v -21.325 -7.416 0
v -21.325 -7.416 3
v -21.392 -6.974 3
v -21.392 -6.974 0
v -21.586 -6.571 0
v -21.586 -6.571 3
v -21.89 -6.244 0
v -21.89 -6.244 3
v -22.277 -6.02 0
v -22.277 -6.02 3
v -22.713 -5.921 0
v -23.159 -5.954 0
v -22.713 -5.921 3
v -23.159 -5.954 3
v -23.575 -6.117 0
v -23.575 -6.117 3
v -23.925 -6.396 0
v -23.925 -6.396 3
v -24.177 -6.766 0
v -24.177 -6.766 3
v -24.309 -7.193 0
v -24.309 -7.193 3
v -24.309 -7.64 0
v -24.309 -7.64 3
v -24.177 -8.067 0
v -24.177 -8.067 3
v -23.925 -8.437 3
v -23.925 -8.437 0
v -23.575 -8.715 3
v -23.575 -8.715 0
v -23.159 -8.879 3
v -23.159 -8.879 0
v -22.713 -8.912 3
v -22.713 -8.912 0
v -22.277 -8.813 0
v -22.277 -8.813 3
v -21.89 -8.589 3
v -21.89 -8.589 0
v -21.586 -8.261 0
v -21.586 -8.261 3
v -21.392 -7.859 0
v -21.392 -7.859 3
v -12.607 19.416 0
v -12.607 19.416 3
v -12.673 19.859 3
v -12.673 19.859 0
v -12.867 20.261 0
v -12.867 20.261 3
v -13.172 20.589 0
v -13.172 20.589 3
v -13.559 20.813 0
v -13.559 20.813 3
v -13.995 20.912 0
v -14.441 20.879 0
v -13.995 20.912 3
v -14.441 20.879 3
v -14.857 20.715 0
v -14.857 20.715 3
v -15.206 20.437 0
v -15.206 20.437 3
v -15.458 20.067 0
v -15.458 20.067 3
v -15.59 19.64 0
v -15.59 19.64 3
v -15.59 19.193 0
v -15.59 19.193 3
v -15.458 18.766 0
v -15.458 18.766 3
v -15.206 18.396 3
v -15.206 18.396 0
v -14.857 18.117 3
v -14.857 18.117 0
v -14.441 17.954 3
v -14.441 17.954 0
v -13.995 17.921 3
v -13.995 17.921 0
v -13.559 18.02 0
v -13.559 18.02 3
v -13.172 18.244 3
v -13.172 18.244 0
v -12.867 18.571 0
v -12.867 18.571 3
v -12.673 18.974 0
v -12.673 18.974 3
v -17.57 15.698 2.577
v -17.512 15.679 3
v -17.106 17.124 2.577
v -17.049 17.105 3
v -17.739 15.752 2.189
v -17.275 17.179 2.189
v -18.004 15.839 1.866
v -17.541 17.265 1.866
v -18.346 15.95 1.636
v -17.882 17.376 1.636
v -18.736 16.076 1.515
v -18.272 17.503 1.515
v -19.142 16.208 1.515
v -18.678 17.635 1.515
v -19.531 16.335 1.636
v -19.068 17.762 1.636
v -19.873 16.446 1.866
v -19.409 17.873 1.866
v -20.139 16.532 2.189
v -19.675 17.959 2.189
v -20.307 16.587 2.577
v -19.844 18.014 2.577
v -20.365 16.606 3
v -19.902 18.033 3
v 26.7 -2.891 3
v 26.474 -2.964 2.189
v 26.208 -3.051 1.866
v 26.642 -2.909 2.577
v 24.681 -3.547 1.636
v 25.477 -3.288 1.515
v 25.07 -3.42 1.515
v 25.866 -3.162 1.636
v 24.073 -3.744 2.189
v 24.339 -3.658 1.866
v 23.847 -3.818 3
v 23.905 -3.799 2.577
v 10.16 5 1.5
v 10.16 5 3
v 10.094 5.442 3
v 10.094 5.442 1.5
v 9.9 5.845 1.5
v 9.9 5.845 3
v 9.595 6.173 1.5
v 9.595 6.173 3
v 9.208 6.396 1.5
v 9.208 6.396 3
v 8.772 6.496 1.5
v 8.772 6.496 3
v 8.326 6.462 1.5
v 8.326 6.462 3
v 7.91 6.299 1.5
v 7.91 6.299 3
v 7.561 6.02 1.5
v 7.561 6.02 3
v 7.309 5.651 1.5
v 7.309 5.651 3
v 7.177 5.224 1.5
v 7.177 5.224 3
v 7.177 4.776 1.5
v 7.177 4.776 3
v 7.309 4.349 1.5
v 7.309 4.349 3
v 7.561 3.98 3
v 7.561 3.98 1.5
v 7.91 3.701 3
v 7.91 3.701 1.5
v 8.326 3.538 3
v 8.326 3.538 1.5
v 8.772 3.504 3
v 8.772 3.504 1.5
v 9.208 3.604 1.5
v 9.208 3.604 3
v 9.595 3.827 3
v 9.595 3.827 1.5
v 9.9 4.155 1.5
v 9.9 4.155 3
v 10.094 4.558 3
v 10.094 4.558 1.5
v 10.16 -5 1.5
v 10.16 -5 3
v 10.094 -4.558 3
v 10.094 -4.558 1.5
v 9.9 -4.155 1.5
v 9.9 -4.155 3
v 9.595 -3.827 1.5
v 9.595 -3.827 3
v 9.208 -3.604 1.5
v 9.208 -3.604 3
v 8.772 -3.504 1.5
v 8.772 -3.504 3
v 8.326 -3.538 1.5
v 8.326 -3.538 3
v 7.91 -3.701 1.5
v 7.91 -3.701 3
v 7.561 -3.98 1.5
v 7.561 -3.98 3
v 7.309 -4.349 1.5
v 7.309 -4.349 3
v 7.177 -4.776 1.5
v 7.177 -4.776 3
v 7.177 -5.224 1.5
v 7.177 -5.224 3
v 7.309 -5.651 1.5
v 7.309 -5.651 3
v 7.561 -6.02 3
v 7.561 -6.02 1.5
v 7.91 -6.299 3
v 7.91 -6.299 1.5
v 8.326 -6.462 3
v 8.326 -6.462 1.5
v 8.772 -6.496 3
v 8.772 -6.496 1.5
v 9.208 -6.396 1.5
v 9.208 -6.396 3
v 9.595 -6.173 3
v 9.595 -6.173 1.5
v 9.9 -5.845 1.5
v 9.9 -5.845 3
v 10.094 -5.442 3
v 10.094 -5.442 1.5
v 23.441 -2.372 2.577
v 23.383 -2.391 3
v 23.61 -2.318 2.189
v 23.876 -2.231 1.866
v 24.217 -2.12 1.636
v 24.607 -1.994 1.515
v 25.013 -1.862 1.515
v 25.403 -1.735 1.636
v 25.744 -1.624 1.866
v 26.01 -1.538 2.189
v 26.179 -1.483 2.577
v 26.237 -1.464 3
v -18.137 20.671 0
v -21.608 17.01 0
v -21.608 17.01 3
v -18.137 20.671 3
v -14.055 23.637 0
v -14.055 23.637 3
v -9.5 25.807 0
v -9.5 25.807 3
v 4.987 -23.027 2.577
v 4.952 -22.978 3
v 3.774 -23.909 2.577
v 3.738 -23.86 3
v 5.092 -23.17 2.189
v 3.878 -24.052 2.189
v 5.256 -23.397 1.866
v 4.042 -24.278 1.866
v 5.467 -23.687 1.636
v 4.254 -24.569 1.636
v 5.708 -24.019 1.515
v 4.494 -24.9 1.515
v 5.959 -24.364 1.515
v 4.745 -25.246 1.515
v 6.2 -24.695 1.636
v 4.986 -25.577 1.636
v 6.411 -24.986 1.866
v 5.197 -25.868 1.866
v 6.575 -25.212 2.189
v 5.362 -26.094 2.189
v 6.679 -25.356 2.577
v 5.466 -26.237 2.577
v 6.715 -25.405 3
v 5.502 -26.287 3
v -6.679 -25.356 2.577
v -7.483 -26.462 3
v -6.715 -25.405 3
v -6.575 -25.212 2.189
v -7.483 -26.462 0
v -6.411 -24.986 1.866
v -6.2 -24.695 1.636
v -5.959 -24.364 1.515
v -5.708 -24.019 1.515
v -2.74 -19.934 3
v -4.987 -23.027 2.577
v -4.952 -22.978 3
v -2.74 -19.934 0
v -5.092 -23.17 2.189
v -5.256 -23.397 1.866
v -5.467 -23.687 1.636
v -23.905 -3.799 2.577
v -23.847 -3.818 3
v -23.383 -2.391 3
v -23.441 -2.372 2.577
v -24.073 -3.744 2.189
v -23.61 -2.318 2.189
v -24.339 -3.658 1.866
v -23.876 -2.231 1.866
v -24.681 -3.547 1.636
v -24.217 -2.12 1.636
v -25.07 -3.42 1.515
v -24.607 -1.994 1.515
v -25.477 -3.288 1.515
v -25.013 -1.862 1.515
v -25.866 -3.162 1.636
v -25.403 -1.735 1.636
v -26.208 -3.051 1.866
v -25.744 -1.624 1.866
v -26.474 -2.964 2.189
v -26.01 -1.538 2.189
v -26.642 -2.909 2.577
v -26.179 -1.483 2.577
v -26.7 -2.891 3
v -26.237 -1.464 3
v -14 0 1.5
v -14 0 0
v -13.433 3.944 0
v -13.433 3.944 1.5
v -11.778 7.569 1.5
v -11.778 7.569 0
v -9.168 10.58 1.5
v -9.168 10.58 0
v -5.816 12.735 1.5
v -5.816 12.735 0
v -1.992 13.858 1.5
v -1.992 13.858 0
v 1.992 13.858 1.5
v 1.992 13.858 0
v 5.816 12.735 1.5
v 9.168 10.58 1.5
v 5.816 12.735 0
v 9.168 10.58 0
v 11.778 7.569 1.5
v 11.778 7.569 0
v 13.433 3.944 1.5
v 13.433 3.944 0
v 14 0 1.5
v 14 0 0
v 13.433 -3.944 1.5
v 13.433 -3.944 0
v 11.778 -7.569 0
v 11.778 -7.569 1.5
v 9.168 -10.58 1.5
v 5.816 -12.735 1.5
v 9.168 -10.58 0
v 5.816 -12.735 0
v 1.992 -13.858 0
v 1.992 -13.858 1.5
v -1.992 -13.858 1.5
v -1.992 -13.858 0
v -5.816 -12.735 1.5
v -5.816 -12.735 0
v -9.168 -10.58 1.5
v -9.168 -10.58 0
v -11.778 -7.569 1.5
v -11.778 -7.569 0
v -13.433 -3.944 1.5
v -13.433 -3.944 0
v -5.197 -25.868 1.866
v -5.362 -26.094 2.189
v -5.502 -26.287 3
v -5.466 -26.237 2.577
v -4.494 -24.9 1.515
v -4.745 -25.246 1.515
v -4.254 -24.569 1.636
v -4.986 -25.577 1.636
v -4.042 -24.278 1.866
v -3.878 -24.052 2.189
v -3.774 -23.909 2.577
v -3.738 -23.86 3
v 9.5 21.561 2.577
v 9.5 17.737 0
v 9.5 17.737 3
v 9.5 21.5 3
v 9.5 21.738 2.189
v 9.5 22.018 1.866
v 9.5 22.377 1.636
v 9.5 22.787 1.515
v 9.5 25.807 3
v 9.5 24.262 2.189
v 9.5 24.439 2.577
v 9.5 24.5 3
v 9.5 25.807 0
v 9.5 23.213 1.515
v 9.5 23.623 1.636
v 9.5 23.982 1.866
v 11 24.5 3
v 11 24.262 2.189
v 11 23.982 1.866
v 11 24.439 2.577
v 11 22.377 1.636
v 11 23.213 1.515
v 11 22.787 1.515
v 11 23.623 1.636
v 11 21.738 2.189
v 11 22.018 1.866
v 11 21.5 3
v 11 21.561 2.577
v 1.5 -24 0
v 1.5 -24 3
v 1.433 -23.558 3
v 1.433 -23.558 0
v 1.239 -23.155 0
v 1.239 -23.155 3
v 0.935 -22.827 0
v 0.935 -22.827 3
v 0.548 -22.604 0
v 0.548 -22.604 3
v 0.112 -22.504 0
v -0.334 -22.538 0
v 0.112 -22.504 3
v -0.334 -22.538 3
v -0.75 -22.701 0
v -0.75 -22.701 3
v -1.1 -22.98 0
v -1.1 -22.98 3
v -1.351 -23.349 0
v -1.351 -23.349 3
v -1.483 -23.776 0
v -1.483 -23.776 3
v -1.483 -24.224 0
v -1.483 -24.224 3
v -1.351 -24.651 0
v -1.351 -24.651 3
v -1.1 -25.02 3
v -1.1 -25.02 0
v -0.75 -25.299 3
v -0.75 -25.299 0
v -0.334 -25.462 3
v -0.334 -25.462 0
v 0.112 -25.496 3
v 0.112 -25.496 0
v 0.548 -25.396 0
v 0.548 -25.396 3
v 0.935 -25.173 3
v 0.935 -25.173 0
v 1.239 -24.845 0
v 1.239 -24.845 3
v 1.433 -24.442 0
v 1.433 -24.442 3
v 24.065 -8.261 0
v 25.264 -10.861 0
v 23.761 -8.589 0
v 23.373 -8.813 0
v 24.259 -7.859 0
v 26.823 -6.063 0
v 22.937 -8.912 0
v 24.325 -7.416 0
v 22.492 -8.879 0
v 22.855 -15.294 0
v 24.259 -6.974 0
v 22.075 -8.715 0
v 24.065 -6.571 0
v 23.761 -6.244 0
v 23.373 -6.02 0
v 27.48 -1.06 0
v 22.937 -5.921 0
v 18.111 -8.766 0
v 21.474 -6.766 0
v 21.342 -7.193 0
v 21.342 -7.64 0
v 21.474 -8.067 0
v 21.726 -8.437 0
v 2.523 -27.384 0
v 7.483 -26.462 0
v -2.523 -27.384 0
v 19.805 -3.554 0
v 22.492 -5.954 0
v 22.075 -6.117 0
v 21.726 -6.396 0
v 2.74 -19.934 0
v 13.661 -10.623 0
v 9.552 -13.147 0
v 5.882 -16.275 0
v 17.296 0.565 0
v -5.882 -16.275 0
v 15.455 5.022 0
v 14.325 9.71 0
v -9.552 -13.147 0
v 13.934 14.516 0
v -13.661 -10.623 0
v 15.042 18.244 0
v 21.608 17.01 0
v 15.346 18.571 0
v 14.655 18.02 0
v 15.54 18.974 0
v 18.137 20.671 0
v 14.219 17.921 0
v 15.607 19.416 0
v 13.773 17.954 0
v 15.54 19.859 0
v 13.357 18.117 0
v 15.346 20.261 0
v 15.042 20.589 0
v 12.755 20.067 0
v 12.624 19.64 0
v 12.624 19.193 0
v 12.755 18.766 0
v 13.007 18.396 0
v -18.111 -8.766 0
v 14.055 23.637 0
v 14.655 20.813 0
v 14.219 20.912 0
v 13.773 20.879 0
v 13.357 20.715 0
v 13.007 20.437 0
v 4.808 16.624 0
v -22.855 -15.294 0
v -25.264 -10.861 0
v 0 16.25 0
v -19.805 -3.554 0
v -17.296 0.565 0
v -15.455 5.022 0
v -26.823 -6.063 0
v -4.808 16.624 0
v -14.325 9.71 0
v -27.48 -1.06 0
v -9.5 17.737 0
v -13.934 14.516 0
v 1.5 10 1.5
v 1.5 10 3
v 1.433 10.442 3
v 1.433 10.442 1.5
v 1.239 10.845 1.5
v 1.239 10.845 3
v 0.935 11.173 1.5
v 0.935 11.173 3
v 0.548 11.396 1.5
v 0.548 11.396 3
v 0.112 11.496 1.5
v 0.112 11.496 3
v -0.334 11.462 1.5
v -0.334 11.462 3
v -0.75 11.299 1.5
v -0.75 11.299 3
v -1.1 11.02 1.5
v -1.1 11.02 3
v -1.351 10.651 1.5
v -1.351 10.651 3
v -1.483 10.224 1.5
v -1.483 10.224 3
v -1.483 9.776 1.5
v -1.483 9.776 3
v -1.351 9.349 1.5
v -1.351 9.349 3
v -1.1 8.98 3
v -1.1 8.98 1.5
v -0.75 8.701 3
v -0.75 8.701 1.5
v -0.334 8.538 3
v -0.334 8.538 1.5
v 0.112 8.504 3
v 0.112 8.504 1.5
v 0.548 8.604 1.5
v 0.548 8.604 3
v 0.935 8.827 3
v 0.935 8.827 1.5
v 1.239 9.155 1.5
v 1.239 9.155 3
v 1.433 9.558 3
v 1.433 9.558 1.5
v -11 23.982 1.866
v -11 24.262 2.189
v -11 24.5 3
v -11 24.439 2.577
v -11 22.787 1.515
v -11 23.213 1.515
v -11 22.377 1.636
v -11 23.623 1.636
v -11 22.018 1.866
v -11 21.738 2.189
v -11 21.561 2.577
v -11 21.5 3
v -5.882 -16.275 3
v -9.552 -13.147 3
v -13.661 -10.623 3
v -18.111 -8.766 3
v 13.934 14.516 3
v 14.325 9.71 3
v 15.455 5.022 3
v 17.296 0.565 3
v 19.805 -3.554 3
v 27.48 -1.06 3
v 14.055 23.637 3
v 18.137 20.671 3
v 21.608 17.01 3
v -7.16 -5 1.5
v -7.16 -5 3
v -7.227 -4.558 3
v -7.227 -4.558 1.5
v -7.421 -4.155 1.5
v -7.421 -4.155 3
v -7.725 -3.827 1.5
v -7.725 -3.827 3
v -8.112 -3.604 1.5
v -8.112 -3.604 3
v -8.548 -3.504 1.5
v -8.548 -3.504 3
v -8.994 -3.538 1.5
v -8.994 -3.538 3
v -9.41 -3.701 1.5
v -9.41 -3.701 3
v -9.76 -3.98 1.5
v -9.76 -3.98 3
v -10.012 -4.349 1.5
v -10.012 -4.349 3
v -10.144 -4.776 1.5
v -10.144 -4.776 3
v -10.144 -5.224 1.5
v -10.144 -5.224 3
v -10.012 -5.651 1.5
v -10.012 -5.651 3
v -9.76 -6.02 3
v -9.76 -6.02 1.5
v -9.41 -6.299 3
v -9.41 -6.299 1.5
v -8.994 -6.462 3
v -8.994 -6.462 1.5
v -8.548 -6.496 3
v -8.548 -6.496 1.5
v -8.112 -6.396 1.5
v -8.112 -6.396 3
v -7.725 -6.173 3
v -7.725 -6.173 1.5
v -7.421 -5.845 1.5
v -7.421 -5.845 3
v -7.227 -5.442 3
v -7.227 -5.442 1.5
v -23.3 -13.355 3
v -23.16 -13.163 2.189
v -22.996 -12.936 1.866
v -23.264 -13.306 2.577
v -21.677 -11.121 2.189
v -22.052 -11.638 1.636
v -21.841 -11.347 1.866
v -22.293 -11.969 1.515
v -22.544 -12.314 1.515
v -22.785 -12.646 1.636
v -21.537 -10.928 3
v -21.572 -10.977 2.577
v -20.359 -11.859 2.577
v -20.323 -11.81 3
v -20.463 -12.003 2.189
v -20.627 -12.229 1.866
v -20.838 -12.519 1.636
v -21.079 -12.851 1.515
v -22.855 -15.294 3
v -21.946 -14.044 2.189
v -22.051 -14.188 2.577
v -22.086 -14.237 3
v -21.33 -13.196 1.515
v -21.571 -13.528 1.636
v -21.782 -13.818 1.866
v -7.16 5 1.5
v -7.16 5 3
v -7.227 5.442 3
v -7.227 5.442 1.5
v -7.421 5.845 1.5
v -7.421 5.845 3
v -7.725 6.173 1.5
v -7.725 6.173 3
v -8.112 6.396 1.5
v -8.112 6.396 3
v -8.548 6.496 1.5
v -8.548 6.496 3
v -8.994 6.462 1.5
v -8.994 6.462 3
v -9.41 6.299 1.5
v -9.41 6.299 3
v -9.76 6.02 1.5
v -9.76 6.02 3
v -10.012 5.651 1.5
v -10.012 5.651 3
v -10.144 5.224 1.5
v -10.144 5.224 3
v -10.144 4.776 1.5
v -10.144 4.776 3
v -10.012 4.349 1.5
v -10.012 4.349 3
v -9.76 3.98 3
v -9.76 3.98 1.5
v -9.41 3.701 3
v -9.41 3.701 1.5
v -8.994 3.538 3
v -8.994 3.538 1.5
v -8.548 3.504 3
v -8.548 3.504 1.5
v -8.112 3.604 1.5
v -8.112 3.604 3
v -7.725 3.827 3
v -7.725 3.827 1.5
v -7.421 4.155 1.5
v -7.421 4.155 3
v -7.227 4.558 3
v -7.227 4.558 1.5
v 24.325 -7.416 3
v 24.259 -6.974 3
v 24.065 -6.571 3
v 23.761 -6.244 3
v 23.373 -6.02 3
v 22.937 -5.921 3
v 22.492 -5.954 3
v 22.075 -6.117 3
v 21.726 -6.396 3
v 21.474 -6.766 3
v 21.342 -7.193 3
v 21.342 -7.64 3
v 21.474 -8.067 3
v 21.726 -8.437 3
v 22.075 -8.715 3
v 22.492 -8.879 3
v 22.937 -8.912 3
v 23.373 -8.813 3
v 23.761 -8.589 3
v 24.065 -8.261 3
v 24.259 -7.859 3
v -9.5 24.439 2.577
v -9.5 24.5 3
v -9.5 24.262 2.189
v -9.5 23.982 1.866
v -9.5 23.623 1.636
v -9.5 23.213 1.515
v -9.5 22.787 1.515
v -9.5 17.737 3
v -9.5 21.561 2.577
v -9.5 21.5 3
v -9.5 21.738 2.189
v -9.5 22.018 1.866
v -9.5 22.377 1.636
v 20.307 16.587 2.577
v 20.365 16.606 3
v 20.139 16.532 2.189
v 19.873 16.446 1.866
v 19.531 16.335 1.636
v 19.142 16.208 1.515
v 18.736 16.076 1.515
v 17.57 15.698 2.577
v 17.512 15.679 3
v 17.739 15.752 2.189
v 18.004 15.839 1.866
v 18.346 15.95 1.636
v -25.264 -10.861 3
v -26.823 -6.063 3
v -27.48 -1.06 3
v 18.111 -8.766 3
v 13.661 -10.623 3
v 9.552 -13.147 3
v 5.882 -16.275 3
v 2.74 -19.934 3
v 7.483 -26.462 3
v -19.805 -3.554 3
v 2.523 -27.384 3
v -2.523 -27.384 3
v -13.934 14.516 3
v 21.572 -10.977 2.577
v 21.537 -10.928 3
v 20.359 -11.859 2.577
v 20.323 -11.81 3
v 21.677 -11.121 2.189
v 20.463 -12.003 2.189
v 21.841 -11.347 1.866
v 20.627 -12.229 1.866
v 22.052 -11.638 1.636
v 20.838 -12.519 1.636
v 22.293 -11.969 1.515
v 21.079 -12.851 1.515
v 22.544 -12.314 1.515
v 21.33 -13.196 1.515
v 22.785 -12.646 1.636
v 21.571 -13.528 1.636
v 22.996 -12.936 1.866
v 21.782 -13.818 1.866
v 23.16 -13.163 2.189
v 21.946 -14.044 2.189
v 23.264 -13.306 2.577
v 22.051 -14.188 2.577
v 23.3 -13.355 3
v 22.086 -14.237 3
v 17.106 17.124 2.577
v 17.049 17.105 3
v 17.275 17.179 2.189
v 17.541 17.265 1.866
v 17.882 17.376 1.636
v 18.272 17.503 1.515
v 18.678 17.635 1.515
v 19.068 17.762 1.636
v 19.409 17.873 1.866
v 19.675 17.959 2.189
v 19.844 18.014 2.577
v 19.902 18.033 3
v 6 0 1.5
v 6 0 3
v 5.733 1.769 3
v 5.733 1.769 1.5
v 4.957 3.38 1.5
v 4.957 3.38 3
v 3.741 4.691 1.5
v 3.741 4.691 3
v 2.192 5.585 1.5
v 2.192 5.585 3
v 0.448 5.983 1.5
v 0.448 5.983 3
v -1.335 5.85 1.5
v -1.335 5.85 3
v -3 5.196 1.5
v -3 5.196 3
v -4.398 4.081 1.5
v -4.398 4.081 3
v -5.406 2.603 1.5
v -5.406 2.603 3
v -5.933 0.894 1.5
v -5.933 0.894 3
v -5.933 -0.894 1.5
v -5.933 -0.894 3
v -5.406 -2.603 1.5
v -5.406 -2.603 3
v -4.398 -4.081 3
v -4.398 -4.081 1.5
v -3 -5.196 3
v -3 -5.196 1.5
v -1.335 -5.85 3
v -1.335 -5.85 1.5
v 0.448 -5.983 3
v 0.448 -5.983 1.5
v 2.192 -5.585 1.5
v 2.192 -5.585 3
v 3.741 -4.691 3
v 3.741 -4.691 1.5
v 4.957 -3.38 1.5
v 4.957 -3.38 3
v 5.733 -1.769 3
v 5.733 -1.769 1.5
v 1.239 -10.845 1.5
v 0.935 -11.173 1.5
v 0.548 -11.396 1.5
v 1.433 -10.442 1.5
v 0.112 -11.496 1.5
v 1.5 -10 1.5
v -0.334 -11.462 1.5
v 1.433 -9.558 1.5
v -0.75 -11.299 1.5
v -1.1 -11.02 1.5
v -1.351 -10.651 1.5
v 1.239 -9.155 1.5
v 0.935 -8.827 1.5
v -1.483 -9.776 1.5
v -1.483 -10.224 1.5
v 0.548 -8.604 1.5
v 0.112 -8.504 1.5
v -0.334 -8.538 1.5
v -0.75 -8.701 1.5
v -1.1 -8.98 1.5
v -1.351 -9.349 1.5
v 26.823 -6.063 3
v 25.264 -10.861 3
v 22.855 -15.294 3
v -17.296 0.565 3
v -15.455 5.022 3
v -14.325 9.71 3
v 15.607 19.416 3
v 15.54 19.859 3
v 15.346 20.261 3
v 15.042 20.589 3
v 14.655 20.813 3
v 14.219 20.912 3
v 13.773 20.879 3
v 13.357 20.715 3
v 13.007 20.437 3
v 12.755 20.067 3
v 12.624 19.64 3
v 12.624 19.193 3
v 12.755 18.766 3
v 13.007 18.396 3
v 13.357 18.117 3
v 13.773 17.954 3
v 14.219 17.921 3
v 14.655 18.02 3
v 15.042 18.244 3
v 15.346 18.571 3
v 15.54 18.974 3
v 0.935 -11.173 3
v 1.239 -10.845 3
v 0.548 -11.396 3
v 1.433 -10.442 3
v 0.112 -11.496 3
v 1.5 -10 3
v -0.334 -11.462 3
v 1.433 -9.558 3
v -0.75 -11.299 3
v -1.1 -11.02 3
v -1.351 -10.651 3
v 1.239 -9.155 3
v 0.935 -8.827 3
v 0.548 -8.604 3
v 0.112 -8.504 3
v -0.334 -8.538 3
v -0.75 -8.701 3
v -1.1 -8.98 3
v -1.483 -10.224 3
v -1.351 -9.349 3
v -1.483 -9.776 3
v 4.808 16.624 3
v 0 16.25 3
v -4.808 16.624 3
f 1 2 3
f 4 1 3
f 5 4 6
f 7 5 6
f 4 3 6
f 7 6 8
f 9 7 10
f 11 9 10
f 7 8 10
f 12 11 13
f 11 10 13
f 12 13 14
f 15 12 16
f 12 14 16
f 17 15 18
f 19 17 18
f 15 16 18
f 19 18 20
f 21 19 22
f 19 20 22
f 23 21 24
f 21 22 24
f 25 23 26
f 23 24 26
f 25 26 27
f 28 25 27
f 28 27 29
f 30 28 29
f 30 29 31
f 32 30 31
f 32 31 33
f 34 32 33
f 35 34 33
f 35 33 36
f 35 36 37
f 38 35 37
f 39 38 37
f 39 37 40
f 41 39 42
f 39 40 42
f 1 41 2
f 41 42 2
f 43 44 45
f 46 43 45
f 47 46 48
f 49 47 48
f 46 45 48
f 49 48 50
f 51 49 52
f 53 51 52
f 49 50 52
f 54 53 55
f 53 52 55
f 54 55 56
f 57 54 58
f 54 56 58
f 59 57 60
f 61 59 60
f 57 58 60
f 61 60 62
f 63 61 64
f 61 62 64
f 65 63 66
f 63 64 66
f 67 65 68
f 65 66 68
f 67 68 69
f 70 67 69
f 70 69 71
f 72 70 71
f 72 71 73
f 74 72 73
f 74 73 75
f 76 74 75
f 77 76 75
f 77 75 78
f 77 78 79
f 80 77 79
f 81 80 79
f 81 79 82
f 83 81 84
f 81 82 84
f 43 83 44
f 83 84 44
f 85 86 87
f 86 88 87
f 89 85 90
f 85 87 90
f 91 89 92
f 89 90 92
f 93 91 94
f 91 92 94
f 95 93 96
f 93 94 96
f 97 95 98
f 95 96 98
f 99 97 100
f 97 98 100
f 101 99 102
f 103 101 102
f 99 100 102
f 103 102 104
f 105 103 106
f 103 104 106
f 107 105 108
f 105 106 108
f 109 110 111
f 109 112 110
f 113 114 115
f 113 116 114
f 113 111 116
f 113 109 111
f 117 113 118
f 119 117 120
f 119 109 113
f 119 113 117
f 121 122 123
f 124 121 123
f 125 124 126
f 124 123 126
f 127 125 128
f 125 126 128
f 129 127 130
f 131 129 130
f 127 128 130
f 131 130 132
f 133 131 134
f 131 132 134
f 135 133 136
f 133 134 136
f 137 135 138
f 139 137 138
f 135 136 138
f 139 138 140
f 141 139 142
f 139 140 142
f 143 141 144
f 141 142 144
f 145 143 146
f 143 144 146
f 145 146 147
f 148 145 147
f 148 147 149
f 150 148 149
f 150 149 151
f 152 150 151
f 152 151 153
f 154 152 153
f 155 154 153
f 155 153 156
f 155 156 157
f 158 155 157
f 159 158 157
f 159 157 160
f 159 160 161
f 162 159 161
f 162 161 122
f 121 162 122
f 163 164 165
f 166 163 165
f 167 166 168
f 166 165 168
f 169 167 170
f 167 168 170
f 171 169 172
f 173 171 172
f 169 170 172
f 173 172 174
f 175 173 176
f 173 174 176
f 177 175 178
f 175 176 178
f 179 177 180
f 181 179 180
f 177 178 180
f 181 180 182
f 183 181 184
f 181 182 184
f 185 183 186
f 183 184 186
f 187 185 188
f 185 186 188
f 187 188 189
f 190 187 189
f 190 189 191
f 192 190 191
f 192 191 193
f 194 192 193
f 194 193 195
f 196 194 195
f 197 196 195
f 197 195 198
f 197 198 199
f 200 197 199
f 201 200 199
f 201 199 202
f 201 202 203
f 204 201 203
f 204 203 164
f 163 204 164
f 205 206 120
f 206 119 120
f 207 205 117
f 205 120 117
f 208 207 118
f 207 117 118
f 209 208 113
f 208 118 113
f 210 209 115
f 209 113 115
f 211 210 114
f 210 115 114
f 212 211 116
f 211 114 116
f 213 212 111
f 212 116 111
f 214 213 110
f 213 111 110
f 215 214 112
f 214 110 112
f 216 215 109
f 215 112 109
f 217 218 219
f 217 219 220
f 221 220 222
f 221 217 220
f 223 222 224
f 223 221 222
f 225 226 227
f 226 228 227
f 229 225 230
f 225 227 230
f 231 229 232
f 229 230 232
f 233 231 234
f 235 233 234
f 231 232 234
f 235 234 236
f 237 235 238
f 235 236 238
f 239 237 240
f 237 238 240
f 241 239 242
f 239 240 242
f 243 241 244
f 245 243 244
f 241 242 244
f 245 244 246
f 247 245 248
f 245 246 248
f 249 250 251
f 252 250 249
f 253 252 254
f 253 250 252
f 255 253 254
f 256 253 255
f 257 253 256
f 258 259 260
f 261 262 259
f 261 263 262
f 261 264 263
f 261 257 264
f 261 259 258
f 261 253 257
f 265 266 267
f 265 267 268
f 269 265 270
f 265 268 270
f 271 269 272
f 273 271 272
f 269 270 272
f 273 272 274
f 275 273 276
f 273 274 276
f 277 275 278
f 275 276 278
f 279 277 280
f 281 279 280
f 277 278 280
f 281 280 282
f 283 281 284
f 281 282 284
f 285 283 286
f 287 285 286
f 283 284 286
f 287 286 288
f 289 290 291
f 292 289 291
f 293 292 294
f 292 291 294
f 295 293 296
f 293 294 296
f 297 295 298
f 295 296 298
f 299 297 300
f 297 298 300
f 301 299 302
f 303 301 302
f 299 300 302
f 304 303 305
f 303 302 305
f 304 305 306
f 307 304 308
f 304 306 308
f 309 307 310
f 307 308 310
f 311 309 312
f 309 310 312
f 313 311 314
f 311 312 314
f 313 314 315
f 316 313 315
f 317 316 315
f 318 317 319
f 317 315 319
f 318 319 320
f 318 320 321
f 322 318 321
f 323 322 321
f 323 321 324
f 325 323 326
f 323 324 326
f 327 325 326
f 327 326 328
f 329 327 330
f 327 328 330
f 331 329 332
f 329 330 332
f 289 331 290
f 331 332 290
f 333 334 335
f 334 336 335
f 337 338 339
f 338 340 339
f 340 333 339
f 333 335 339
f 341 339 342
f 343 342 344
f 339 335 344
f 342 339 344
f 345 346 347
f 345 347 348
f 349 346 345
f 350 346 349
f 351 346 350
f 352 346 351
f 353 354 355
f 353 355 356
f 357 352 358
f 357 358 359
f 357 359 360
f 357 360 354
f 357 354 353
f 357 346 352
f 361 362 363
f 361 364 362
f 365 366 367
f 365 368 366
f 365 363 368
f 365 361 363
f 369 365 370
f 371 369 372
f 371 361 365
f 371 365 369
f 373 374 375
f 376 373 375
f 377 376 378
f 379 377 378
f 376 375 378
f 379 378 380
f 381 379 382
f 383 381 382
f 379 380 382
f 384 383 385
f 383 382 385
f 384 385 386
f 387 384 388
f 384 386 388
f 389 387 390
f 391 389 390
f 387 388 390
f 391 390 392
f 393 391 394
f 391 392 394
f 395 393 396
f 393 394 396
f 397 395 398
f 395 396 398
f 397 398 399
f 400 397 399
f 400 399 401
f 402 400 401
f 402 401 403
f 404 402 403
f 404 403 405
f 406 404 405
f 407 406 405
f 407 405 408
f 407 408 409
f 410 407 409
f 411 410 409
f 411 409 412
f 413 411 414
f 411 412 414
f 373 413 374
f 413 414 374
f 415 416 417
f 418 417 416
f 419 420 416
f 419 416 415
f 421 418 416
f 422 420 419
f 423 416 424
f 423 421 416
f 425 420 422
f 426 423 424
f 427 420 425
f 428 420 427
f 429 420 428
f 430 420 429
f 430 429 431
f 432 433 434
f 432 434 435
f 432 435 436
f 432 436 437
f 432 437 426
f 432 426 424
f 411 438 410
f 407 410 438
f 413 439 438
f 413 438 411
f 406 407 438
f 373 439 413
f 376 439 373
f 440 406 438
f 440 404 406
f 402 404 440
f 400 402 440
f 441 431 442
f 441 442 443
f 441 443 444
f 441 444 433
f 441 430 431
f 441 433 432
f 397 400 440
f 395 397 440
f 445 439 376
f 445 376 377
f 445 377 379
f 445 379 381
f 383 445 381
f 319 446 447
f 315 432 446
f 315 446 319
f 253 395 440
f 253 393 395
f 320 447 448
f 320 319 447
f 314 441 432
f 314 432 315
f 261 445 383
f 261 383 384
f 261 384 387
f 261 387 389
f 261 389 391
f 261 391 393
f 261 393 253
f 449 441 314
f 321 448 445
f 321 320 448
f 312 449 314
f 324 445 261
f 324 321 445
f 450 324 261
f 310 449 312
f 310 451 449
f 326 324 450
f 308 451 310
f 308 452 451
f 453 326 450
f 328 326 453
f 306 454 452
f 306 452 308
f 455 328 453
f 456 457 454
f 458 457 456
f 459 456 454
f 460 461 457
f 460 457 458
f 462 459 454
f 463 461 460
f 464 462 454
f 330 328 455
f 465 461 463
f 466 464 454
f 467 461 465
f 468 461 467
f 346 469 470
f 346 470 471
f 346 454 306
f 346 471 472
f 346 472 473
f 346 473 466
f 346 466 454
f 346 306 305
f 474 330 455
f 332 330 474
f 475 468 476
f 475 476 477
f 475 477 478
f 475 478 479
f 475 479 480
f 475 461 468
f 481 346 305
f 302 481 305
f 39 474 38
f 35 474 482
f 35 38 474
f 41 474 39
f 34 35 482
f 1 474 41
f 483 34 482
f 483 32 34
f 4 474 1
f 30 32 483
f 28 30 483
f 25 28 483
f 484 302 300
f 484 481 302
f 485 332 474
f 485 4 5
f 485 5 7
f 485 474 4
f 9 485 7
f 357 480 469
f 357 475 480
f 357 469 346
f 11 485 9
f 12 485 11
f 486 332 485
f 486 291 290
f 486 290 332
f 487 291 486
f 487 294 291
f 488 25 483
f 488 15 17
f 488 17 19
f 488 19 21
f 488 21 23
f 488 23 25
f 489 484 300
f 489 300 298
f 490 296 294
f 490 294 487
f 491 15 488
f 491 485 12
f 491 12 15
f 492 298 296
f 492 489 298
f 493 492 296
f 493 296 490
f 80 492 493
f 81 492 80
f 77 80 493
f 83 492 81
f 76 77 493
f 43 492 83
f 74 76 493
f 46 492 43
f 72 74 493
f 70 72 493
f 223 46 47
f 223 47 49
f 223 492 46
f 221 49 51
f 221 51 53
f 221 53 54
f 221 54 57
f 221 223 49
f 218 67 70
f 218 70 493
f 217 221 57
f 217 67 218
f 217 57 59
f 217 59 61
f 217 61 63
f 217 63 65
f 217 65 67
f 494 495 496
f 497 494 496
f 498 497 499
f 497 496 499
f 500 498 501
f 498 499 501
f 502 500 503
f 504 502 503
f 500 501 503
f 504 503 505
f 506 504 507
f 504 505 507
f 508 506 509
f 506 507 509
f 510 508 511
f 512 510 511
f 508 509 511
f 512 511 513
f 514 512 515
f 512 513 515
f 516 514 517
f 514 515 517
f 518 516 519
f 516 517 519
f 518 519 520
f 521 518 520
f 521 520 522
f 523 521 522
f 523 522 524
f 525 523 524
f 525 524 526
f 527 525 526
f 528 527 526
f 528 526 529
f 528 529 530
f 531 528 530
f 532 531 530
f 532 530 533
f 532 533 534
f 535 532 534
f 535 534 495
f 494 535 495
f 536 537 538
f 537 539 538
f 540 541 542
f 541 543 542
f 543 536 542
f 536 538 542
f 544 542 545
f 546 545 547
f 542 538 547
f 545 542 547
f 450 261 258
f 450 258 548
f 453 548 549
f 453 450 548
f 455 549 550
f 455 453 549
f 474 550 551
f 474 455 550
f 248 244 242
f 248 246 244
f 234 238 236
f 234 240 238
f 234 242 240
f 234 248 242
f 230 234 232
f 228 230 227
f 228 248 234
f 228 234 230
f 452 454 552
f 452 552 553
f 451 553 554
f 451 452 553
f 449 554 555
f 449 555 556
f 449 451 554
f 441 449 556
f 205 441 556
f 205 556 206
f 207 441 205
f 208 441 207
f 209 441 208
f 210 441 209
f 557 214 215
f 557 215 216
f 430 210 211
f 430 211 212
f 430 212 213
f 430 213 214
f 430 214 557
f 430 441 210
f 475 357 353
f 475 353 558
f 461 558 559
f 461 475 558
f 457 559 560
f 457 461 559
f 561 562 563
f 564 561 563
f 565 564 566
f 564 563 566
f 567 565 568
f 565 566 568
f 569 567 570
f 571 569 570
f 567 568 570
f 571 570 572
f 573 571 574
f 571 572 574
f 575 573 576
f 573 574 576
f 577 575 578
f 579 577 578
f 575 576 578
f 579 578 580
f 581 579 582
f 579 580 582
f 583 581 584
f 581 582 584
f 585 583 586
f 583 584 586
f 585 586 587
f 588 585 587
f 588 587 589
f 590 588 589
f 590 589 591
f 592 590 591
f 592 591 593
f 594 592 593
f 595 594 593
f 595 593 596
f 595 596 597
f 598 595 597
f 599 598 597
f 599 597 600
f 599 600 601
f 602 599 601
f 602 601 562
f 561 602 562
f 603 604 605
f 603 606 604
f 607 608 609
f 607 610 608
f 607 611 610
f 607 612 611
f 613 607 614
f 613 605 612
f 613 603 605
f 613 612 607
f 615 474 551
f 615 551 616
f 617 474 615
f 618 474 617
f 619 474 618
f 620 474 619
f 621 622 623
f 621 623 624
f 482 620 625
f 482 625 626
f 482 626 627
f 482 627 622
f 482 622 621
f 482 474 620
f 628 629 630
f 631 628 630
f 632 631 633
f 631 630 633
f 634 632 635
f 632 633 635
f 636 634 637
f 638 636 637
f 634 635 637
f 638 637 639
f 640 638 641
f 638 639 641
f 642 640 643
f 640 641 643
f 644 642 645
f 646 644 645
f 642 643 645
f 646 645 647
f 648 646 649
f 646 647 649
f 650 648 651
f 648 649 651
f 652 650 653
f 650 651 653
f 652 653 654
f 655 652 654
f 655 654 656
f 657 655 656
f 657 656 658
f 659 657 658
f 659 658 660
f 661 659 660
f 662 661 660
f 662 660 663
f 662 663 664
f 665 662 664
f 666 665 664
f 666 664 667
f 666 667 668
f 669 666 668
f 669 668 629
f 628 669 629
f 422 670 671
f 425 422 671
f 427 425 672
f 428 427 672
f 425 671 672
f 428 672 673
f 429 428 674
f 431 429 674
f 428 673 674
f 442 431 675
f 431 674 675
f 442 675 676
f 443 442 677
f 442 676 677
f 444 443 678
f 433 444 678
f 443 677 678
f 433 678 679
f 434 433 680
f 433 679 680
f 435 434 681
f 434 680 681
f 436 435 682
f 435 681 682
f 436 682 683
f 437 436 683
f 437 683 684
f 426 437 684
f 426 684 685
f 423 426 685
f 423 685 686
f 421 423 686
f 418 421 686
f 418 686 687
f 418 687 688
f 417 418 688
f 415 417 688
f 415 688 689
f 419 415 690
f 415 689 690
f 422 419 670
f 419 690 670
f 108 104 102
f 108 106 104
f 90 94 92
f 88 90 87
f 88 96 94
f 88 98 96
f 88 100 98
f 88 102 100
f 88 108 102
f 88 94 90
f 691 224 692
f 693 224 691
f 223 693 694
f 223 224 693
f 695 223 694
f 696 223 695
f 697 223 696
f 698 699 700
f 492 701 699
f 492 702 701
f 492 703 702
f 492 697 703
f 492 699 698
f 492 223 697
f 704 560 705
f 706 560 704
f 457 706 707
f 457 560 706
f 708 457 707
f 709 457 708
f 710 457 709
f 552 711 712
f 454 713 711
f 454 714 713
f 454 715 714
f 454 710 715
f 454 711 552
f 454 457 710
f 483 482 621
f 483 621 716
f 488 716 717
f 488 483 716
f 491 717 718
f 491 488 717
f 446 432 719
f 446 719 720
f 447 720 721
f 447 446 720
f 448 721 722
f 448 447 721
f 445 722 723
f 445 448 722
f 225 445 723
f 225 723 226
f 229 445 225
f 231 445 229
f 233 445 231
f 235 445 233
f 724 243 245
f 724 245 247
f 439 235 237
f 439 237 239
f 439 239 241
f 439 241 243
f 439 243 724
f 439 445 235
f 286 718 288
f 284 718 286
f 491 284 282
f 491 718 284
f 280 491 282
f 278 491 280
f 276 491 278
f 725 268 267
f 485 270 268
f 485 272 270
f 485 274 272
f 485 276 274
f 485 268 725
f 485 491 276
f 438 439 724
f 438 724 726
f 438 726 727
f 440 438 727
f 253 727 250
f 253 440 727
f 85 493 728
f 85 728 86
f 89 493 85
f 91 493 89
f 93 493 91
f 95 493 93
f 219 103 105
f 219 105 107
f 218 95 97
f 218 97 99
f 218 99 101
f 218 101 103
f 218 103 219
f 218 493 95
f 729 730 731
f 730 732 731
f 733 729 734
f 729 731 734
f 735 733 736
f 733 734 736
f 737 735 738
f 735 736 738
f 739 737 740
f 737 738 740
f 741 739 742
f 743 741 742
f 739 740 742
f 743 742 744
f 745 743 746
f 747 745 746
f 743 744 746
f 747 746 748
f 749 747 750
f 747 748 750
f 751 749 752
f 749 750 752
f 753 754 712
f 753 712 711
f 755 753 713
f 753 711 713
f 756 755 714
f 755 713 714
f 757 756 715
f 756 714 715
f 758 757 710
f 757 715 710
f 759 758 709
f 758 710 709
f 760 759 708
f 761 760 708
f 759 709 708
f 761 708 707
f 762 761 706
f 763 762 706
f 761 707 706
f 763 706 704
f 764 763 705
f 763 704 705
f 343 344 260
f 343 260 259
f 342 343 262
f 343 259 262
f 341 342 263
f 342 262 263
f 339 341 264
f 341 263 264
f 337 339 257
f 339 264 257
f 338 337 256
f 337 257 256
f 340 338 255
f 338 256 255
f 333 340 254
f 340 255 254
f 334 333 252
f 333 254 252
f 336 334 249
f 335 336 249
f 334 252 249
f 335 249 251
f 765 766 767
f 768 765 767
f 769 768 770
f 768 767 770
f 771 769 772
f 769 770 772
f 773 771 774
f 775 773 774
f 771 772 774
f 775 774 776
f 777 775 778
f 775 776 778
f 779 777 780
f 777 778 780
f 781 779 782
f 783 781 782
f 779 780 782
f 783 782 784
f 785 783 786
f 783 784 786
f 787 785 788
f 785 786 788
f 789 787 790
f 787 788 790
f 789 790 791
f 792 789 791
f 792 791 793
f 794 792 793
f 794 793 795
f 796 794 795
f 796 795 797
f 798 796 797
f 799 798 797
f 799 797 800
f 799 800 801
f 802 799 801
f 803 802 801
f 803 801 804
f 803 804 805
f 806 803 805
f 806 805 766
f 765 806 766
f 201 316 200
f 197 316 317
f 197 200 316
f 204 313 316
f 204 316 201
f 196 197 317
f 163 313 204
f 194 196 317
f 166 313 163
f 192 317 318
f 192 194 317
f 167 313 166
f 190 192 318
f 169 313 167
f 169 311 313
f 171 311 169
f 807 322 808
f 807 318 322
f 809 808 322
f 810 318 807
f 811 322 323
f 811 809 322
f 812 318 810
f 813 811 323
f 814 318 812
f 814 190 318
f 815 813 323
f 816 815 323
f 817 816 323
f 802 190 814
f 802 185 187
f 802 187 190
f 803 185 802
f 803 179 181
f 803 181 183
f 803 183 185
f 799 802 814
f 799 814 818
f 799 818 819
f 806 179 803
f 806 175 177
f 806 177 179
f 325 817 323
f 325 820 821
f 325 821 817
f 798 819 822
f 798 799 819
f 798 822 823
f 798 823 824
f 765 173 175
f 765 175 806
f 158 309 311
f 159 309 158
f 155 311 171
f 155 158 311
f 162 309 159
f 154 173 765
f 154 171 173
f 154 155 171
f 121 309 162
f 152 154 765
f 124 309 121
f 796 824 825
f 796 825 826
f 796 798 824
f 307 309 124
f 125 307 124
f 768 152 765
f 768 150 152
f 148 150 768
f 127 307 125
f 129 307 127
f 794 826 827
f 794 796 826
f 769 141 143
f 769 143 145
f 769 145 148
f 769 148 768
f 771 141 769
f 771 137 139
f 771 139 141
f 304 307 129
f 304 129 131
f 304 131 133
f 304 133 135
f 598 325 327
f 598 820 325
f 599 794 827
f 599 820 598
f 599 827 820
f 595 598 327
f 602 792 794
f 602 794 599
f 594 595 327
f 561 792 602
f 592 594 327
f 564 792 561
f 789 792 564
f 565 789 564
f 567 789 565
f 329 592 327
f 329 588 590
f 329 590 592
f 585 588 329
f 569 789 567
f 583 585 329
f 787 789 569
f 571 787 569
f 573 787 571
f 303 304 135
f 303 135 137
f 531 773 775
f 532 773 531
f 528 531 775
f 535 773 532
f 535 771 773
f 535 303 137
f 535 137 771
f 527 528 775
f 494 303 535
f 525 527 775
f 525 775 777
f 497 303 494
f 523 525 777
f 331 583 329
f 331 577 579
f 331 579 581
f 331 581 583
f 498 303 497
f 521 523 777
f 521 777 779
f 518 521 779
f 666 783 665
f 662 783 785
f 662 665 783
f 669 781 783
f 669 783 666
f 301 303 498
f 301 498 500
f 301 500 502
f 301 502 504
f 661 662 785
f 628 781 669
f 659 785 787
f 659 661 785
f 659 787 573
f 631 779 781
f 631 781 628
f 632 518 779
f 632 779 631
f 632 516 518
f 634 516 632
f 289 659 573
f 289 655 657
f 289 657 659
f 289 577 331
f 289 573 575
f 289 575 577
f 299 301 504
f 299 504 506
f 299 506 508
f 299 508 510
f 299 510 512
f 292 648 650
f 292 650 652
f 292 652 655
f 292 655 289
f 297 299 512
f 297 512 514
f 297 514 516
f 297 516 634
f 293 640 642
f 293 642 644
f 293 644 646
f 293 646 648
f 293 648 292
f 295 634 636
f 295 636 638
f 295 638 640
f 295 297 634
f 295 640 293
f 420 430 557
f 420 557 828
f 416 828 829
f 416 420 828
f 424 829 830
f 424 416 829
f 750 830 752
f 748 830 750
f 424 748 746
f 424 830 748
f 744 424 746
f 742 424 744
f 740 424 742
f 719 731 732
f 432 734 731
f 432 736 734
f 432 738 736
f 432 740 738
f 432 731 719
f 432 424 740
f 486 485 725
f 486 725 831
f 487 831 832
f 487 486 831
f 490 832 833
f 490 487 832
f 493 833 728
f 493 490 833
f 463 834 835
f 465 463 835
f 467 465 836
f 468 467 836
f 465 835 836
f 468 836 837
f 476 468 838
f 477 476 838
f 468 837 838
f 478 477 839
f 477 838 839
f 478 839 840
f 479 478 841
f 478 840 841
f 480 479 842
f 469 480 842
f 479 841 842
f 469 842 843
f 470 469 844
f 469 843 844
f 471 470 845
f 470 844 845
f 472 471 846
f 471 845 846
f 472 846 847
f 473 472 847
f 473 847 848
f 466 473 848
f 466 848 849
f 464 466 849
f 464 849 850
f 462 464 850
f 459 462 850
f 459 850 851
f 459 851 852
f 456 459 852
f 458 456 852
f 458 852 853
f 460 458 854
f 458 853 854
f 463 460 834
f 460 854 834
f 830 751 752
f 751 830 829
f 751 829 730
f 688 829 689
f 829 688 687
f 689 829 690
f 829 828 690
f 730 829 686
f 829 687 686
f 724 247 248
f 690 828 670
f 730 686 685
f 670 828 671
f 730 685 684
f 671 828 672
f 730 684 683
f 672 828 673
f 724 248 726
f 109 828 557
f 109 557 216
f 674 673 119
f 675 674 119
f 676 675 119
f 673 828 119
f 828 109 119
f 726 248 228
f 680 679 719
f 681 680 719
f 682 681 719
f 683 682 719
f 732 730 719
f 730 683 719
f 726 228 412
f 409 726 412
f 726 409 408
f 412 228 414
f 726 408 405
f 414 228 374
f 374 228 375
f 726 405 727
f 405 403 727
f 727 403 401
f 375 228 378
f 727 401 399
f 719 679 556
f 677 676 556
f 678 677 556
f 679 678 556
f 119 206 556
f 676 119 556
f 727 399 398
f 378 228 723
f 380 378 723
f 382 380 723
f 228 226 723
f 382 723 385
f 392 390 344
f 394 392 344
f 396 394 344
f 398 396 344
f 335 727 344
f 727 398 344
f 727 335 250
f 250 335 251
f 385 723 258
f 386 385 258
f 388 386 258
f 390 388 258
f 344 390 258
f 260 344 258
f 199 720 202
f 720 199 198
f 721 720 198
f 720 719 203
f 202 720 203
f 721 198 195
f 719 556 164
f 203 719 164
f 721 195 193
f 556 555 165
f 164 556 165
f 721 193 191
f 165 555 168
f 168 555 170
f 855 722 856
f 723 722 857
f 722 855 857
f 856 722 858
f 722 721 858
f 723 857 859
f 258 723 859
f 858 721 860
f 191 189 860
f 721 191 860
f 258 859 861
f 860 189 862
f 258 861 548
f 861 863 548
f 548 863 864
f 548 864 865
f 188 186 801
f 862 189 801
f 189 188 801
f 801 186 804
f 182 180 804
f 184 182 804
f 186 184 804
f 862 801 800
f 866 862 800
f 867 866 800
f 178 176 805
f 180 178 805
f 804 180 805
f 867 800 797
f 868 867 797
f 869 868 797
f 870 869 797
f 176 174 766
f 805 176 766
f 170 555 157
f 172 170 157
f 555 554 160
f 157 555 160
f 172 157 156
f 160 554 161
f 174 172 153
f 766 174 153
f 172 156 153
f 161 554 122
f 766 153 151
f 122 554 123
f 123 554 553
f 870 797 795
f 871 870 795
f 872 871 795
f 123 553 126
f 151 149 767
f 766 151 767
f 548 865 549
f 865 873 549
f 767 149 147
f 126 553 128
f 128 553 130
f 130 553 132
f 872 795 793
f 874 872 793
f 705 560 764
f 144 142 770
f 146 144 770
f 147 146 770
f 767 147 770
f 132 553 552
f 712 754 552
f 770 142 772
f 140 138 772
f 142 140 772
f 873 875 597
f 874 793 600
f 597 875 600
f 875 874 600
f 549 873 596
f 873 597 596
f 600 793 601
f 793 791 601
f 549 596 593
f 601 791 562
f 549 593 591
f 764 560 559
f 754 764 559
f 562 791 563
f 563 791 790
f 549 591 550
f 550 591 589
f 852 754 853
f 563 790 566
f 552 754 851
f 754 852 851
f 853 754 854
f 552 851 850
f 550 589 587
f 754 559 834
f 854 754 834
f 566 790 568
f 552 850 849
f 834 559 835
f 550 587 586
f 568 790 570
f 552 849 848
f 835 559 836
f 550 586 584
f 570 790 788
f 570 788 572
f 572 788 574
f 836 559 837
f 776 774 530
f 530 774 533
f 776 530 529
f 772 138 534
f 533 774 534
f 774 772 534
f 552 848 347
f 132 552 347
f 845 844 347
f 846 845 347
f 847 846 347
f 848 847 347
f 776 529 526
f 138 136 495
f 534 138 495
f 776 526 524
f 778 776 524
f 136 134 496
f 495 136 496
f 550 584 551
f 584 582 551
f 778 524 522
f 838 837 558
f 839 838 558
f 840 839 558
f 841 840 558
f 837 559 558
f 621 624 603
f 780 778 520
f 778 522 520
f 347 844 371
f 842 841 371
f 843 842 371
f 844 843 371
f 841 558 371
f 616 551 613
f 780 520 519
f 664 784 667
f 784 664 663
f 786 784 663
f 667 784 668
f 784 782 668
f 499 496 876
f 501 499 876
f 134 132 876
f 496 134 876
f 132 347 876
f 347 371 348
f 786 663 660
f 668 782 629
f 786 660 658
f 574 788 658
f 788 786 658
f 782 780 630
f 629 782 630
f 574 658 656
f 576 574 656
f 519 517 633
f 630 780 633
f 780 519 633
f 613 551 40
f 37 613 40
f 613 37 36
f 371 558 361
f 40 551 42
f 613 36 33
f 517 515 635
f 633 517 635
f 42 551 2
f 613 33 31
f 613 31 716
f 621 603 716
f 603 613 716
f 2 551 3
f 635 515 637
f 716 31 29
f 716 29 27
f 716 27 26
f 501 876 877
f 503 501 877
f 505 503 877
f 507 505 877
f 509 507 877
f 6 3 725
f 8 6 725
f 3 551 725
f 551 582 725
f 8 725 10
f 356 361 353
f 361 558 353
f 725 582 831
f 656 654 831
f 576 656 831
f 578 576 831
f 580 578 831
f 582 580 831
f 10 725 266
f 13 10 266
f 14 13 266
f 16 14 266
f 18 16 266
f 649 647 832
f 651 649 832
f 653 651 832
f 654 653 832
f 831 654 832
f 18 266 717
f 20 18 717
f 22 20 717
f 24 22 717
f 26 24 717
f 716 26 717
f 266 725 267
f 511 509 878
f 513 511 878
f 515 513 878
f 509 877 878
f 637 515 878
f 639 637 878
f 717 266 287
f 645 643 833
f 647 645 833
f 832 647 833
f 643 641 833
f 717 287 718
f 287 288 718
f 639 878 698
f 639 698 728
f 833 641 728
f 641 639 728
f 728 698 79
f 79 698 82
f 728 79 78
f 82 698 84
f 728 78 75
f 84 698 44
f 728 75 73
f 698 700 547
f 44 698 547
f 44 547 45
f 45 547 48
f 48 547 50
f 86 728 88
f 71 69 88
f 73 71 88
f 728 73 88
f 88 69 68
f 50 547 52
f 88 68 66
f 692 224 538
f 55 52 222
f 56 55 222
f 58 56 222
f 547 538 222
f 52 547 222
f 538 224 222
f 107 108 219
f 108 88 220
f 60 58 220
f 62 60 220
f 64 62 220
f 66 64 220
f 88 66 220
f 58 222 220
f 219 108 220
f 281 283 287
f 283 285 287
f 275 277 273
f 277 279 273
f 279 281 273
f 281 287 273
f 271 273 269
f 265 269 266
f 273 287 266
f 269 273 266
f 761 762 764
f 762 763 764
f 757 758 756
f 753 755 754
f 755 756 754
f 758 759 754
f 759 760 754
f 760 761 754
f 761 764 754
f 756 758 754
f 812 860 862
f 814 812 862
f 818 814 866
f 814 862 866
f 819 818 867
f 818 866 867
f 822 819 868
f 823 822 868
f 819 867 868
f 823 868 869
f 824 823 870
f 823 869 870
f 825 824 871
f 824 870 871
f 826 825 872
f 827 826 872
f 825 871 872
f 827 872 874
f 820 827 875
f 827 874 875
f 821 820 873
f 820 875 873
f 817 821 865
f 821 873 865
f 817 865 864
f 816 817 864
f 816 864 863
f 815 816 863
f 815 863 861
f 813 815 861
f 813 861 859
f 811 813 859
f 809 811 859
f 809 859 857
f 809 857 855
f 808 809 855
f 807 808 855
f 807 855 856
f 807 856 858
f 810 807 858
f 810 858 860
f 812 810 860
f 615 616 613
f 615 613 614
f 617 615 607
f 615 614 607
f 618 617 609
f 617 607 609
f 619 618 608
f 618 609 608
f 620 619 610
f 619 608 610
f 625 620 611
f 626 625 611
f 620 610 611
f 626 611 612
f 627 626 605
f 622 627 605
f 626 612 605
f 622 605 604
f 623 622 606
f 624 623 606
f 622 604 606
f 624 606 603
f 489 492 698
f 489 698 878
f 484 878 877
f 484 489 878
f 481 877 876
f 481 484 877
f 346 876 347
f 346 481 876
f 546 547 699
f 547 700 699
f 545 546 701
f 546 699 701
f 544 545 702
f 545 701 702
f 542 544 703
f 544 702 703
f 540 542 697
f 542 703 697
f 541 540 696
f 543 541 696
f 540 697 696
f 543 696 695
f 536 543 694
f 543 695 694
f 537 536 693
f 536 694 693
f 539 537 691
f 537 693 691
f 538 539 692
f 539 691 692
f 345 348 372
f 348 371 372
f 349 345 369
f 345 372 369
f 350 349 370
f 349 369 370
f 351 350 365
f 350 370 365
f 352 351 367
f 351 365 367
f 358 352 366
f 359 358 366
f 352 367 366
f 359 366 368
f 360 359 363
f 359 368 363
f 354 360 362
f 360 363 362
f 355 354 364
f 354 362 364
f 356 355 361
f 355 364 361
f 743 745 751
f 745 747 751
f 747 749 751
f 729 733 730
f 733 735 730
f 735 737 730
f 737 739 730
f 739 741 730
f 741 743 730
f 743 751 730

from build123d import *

# Parameters (mm, degrees)
BOSS_EXTRUDE1_DEPTH = 3
SKETCH2_R           = 1.5
SKETCH2_R_2         = 6
CUT_EXTRUDE1_DEPTH  = 3
SKETCH5_W           = 22
SKETCH5_H           = 1.5
CIRPATTERN1_COUNT   = 5
SKETCH6_R           = 14
CUT_EXTRUDE2_DEPTH  = 1.5


with BuildPart() as part:
    # Sketch1 → Boss-Extrude1 (new body)
    with BuildSketch(Plane.XY):
        with BuildLine():
            Line((-9.5, 25.806975801), (-9.5, 17.737494192))
            ThreePointArc((-9.5, 17.737494192), (0, 16.25), (9.5, 17.737494192))
            Line((9.5, 17.737494192), (9.5, 25.806975801))
            ThreePointArc((9.5, 25.806975801), (16.164094438, 22.247967345), (21.608231055, 17.009831001))
            Line((21.608231055, 17.009831001), (13.933697987, 14.516224048))
            ThreePointArc((13.933697987, 14.516224048), (15.45466839, 5.021526159), (19.805020881, -3.553849762))
            Line((19.805020881, -3.553849762), (27.479553948, -1.060242809))
            ThreePointArc((27.479553948, -1.060242809), (26.154054198, -8.497967345), (22.854621229, -15.2943221))
            Line((22.854621229, -15.2943221), (18.111498945, -8.765974342))
            ThreePointArc((18.111498945, -8.765974342), (9.55151035, -13.146526159), (2.740176052, -19.933894136))
            Line((2.740176052, -19.933894136), (7.483298336, -26.462241893))
            ThreePointArc((7.483298336, -26.462241893), (0, -27.5), (-7.483298336, -26.462241893))
            Line((-7.483298336, -26.462241893), (-2.740176052, -19.933894136))
            ThreePointArc((-2.740176052, -19.933894136), (-9.55151035, -13.146526159), (-18.111498945, -8.765974342))
            Line((-18.111498945, -8.765974342), (-22.854621229, -15.2943221))
            ThreePointArc((-22.854621229, -15.2943221), (-26.154054198, -8.497967345), (-27.479553948, -1.060242809))
            Line((-27.479553948, -1.060242809), (-19.805020881, -3.553849762))
            ThreePointArc((-19.805020881, -3.553849762), (-15.45466839, 5.021526159), (-13.933697987, 14.516224048))
            Line((-13.933697987, 14.516224048), (-21.608231055, 17.009831001))
            ThreePointArc((-21.608231055, 17.009831001), (-16.164094438, 22.247967345), (-9.5, 25.806975801))
        make_face()
    extrude(amount=BOSS_EXTRUDE1_DEPTH)

    # Sketch2 → Cut-Extrude1 (cut)
    with BuildSketch(Plane.XY.offset(3)):
        with Locations((0, 10)):
            Circle(SKETCH2_R)
        with Locations((-8.660254038, 5)):
            Circle(SKETCH2_R)
        with Locations((-8.660254038, -5)):
            Circle(SKETCH2_R)
        with Locations((0, -10)):
            Circle(SKETCH2_R)
        with Locations((8.660254038, -5)):
            Circle(SKETCH2_R)
        with Locations((8.660254038, 5)):
            Circle(SKETCH2_R)
        Circle(SKETCH2_R_2)
        with Locations((14.106846055, 19.416407865)):
            Circle(SKETCH2_R)
        with Locations((22.825356391, -7.416407865)):
            Circle(SKETCH2_R)
        with Locations((0, -24)):
            Circle(SKETCH2_R)
        with Locations((-22.825356391, -7.416407865)):
            Circle(SKETCH2_R)
        with Locations((-14.106846055, 19.416407865)):
            Circle(SKETCH2_R)
    extrude(amount=-CUT_EXTRUDE1_DEPTH, mode=Mode.SUBTRACT)

    # Sketch5 → Cut-Revolve1 (revolve, cut)
    with BuildSketch(Plane.XY.offset(3)):
        with Locations((0, 23.75)):
            Rectangle(SKETCH5_W, SKETCH5_H)
    cut_revolve1 = revolve(axis=Axis((-11, 23, 3), (1, 0, 0)), mode=Mode.SUBTRACT)

    # CirPattern1: Cut-Revolve1 ×5 about axis
    cirpattern1_axis = Axis((0, 0, 0), (0, 0, 1))
    for i in range(1, CIRPATTERN1_COUNT):
        add(cut_revolve1.rotate(cirpattern1_axis, i * 360 / CIRPATTERN1_COUNT), mode=Mode.SUBTRACT)

    # Sketch6 → Cut-Extrude2 (cut)
    with BuildSketch(Plane(origin=(0, 0, 0), x_dir=(-1, 0, 0), z_dir=(0, 0, -1))):
        Circle(SKETCH6_R)
    extrude(amount=-CUT_EXTRUDE2_DEPTH, mode=Mode.SUBTRACT)


solid = part.part
